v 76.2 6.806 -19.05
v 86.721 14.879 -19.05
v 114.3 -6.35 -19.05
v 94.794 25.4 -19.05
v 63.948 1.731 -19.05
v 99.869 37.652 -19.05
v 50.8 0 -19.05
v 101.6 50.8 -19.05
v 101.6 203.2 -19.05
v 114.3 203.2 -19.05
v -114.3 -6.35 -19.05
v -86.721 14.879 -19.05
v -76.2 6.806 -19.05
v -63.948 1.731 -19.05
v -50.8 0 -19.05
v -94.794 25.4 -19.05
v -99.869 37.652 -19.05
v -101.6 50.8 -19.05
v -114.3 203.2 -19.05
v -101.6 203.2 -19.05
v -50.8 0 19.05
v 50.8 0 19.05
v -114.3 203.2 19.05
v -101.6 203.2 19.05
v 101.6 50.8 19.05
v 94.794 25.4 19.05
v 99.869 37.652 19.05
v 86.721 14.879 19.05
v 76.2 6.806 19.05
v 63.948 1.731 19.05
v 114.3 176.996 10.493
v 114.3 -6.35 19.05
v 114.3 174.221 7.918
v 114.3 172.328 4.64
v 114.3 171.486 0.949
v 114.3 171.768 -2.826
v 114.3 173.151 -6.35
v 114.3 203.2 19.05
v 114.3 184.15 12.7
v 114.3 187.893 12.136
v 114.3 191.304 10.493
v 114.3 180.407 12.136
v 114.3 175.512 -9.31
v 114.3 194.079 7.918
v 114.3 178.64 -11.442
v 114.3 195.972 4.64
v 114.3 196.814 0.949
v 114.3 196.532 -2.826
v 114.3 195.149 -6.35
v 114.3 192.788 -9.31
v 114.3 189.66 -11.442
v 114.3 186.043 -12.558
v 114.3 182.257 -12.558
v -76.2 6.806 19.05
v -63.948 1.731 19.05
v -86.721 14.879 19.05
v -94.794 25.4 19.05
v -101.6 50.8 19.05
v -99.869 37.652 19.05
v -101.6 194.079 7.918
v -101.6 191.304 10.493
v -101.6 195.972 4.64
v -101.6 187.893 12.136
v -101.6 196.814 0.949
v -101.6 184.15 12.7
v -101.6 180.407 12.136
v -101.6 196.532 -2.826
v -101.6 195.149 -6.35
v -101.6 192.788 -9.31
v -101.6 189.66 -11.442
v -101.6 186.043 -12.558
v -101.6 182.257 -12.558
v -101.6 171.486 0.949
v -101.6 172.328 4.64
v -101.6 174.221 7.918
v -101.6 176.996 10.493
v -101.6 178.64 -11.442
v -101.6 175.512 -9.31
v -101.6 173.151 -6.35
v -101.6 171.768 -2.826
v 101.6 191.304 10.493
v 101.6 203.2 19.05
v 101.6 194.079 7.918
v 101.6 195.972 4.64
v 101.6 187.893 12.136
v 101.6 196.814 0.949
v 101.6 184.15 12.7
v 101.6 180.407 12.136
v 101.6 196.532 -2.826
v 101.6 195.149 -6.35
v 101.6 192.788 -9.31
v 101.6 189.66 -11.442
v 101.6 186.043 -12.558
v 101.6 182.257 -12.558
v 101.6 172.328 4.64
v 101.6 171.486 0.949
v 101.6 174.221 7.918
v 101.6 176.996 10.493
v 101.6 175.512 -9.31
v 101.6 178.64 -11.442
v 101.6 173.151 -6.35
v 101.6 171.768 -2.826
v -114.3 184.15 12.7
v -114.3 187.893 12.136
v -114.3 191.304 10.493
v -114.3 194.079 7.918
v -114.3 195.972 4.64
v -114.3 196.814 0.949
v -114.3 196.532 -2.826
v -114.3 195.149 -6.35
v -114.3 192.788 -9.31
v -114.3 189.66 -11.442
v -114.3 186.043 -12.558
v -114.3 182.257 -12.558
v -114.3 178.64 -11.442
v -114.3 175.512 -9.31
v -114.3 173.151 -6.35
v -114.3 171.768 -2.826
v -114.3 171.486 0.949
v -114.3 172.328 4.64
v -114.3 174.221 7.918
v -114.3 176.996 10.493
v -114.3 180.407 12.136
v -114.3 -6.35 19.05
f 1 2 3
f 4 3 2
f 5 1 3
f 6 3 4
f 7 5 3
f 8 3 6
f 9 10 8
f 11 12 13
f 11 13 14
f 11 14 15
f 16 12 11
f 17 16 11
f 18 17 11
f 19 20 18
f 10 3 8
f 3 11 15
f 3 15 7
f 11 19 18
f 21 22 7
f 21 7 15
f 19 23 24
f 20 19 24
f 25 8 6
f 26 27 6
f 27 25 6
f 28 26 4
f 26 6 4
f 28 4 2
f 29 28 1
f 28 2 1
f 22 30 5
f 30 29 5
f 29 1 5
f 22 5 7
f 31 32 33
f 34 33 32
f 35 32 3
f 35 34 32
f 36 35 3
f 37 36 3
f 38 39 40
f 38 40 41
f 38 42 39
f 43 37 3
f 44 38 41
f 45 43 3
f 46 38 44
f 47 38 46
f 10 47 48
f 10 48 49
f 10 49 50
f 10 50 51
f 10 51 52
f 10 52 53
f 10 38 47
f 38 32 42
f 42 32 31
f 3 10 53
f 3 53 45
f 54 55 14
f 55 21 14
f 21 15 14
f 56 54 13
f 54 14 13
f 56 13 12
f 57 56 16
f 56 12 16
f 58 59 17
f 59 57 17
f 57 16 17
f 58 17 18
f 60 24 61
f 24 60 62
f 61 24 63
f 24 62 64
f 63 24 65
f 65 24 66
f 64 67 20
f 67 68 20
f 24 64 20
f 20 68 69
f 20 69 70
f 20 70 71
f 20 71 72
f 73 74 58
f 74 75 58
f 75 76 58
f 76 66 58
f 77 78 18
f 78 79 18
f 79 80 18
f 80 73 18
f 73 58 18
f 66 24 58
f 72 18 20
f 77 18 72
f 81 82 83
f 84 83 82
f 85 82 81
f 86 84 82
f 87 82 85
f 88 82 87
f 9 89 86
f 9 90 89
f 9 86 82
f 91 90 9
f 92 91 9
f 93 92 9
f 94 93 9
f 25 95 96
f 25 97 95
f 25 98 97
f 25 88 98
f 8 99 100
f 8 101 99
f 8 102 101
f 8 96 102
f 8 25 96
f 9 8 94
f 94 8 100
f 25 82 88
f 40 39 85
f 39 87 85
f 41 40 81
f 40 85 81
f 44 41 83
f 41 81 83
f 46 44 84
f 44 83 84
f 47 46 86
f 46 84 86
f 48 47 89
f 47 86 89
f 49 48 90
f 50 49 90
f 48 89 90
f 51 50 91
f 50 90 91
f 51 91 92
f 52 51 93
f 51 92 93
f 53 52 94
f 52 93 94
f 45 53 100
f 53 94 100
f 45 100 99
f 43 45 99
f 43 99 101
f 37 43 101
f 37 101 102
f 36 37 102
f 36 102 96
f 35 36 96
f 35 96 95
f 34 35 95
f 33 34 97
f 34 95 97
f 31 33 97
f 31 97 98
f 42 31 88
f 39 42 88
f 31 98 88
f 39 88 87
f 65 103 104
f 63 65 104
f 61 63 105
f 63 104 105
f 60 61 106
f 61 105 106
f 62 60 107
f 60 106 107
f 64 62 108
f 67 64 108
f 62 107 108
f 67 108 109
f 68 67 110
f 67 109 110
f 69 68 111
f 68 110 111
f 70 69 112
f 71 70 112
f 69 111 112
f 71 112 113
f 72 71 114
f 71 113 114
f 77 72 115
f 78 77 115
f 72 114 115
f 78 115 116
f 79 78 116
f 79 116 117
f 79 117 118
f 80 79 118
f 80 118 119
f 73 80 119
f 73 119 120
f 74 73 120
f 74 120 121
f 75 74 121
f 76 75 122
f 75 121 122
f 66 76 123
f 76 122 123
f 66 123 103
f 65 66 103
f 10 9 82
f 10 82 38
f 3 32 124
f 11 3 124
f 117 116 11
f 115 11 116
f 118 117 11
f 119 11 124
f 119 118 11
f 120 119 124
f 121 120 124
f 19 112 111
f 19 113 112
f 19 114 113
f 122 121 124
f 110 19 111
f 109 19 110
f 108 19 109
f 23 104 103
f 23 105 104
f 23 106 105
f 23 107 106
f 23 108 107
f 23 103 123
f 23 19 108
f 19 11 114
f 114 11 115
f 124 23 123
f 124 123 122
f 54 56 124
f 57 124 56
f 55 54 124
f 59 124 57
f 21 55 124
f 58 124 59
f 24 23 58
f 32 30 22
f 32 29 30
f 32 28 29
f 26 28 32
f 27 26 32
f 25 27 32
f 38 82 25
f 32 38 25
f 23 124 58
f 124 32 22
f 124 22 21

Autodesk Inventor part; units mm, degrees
ref_plane "YZ Plane" through (0, 0, 0) normal (1, 0, 0) x (0, 1, 0)
ref_plane "XZ Plane" through (0, 0, 0) normal (0, 1, 0) x (-1, 0, 0)
ref_plane "XY Plane" through (0, 0, 0) normal (0, 0, 1) x (1, 0, 0)
sketch "Sketch1" plane through (0, 0, 0) normal (0, 1, 0) x (-1, 0, 0)
  line L0 (114.3, 19.05) -> (-114.3, 19.05)
  line L1 (-114.3, 19.05) -> (-114.3, -19.05)
  line L2 (-114.3, -19.05) -> (114.3, -19.05)
  line L3 (114.3, -19.05) -> (114.3, 19.05)
  line L4 (114.3, 19.05) -> (-114.3, -19.05) construction
  line L5 (-114.3, 19.05) -> (114.3, -19.05) construction
  point P0 (0, 0)
  dimension "d0" = 228.6
  dimension "d1" = 38.1
extrude "Extrusion1" add sketch "Sketch1" against normal blind 6.35
sketch "Sketch2" plane through (0, 0, 0) normal (0, 1, 0) x (1, 0, 0)
  line L0 (-114.3, -19.05) -> (-114.3, 19.05) projected
  line L1 (-114.3, 19.05) -> (114.3, 19.05) projected
  line L2 (-114.3, -19.05) -> (-101.6, -19.05)
  line L3 (-101.6, -19.05) -> (-101.6, 19.05)
  line L4 (-101.6, 19.05) -> (-114.3, 19.05)
  line L5 (-114.3, 19.05) -> (-114.3, -19.05)
  line L6 (114.3, 19.05) -> (114.3, -19.05) projected
  line L7 (114.3, -19.05) -> (101.6, -19.05)
  line L8 (101.6, -19.05) -> (101.6, 19.05)
  line L9 (101.6, 19.05) -> (114.3, 19.05)
  line L10 (114.3, 19.05) -> (114.3, -19.05)
  point P0 (0, 0)
  dimension "d4" = 12.7
  dimension "d5" = 12.7
extrude "Extrusion2" add sketch "Sketch2" along normal blind 203.2
sketch "Sketch3" plane through (-114.3, -6.35, -19.05) normal (-1, 0, 0) x (0, 0, 1)
  line L0 (0, 209.55) -> (38.1, 209.55) construction
  line L1 (19.05, 209.55) -> (19.05, 0) construction
  line L2 (38.1, 0) -> (0, 0) construction
  circle A0 centre (19.05, 190.5) radius 12.7
  line L3 (0, 6.35) -> (0, 209.55) construction
  line L4 (0, 203.2) -> (38.1, 203.2) construction
  point P0 (19.05, 6.35)
  dimension "d8" = 25.4
  dimension "d9" = 6.35
extrude "Extrusion3" cut sketch "Sketch3" against normal through all
fillet "Fillet1" radius 50.8 2 edges at (101.6, 0, 0) (-101.6, 0, 0)
properties part number "fork04"
